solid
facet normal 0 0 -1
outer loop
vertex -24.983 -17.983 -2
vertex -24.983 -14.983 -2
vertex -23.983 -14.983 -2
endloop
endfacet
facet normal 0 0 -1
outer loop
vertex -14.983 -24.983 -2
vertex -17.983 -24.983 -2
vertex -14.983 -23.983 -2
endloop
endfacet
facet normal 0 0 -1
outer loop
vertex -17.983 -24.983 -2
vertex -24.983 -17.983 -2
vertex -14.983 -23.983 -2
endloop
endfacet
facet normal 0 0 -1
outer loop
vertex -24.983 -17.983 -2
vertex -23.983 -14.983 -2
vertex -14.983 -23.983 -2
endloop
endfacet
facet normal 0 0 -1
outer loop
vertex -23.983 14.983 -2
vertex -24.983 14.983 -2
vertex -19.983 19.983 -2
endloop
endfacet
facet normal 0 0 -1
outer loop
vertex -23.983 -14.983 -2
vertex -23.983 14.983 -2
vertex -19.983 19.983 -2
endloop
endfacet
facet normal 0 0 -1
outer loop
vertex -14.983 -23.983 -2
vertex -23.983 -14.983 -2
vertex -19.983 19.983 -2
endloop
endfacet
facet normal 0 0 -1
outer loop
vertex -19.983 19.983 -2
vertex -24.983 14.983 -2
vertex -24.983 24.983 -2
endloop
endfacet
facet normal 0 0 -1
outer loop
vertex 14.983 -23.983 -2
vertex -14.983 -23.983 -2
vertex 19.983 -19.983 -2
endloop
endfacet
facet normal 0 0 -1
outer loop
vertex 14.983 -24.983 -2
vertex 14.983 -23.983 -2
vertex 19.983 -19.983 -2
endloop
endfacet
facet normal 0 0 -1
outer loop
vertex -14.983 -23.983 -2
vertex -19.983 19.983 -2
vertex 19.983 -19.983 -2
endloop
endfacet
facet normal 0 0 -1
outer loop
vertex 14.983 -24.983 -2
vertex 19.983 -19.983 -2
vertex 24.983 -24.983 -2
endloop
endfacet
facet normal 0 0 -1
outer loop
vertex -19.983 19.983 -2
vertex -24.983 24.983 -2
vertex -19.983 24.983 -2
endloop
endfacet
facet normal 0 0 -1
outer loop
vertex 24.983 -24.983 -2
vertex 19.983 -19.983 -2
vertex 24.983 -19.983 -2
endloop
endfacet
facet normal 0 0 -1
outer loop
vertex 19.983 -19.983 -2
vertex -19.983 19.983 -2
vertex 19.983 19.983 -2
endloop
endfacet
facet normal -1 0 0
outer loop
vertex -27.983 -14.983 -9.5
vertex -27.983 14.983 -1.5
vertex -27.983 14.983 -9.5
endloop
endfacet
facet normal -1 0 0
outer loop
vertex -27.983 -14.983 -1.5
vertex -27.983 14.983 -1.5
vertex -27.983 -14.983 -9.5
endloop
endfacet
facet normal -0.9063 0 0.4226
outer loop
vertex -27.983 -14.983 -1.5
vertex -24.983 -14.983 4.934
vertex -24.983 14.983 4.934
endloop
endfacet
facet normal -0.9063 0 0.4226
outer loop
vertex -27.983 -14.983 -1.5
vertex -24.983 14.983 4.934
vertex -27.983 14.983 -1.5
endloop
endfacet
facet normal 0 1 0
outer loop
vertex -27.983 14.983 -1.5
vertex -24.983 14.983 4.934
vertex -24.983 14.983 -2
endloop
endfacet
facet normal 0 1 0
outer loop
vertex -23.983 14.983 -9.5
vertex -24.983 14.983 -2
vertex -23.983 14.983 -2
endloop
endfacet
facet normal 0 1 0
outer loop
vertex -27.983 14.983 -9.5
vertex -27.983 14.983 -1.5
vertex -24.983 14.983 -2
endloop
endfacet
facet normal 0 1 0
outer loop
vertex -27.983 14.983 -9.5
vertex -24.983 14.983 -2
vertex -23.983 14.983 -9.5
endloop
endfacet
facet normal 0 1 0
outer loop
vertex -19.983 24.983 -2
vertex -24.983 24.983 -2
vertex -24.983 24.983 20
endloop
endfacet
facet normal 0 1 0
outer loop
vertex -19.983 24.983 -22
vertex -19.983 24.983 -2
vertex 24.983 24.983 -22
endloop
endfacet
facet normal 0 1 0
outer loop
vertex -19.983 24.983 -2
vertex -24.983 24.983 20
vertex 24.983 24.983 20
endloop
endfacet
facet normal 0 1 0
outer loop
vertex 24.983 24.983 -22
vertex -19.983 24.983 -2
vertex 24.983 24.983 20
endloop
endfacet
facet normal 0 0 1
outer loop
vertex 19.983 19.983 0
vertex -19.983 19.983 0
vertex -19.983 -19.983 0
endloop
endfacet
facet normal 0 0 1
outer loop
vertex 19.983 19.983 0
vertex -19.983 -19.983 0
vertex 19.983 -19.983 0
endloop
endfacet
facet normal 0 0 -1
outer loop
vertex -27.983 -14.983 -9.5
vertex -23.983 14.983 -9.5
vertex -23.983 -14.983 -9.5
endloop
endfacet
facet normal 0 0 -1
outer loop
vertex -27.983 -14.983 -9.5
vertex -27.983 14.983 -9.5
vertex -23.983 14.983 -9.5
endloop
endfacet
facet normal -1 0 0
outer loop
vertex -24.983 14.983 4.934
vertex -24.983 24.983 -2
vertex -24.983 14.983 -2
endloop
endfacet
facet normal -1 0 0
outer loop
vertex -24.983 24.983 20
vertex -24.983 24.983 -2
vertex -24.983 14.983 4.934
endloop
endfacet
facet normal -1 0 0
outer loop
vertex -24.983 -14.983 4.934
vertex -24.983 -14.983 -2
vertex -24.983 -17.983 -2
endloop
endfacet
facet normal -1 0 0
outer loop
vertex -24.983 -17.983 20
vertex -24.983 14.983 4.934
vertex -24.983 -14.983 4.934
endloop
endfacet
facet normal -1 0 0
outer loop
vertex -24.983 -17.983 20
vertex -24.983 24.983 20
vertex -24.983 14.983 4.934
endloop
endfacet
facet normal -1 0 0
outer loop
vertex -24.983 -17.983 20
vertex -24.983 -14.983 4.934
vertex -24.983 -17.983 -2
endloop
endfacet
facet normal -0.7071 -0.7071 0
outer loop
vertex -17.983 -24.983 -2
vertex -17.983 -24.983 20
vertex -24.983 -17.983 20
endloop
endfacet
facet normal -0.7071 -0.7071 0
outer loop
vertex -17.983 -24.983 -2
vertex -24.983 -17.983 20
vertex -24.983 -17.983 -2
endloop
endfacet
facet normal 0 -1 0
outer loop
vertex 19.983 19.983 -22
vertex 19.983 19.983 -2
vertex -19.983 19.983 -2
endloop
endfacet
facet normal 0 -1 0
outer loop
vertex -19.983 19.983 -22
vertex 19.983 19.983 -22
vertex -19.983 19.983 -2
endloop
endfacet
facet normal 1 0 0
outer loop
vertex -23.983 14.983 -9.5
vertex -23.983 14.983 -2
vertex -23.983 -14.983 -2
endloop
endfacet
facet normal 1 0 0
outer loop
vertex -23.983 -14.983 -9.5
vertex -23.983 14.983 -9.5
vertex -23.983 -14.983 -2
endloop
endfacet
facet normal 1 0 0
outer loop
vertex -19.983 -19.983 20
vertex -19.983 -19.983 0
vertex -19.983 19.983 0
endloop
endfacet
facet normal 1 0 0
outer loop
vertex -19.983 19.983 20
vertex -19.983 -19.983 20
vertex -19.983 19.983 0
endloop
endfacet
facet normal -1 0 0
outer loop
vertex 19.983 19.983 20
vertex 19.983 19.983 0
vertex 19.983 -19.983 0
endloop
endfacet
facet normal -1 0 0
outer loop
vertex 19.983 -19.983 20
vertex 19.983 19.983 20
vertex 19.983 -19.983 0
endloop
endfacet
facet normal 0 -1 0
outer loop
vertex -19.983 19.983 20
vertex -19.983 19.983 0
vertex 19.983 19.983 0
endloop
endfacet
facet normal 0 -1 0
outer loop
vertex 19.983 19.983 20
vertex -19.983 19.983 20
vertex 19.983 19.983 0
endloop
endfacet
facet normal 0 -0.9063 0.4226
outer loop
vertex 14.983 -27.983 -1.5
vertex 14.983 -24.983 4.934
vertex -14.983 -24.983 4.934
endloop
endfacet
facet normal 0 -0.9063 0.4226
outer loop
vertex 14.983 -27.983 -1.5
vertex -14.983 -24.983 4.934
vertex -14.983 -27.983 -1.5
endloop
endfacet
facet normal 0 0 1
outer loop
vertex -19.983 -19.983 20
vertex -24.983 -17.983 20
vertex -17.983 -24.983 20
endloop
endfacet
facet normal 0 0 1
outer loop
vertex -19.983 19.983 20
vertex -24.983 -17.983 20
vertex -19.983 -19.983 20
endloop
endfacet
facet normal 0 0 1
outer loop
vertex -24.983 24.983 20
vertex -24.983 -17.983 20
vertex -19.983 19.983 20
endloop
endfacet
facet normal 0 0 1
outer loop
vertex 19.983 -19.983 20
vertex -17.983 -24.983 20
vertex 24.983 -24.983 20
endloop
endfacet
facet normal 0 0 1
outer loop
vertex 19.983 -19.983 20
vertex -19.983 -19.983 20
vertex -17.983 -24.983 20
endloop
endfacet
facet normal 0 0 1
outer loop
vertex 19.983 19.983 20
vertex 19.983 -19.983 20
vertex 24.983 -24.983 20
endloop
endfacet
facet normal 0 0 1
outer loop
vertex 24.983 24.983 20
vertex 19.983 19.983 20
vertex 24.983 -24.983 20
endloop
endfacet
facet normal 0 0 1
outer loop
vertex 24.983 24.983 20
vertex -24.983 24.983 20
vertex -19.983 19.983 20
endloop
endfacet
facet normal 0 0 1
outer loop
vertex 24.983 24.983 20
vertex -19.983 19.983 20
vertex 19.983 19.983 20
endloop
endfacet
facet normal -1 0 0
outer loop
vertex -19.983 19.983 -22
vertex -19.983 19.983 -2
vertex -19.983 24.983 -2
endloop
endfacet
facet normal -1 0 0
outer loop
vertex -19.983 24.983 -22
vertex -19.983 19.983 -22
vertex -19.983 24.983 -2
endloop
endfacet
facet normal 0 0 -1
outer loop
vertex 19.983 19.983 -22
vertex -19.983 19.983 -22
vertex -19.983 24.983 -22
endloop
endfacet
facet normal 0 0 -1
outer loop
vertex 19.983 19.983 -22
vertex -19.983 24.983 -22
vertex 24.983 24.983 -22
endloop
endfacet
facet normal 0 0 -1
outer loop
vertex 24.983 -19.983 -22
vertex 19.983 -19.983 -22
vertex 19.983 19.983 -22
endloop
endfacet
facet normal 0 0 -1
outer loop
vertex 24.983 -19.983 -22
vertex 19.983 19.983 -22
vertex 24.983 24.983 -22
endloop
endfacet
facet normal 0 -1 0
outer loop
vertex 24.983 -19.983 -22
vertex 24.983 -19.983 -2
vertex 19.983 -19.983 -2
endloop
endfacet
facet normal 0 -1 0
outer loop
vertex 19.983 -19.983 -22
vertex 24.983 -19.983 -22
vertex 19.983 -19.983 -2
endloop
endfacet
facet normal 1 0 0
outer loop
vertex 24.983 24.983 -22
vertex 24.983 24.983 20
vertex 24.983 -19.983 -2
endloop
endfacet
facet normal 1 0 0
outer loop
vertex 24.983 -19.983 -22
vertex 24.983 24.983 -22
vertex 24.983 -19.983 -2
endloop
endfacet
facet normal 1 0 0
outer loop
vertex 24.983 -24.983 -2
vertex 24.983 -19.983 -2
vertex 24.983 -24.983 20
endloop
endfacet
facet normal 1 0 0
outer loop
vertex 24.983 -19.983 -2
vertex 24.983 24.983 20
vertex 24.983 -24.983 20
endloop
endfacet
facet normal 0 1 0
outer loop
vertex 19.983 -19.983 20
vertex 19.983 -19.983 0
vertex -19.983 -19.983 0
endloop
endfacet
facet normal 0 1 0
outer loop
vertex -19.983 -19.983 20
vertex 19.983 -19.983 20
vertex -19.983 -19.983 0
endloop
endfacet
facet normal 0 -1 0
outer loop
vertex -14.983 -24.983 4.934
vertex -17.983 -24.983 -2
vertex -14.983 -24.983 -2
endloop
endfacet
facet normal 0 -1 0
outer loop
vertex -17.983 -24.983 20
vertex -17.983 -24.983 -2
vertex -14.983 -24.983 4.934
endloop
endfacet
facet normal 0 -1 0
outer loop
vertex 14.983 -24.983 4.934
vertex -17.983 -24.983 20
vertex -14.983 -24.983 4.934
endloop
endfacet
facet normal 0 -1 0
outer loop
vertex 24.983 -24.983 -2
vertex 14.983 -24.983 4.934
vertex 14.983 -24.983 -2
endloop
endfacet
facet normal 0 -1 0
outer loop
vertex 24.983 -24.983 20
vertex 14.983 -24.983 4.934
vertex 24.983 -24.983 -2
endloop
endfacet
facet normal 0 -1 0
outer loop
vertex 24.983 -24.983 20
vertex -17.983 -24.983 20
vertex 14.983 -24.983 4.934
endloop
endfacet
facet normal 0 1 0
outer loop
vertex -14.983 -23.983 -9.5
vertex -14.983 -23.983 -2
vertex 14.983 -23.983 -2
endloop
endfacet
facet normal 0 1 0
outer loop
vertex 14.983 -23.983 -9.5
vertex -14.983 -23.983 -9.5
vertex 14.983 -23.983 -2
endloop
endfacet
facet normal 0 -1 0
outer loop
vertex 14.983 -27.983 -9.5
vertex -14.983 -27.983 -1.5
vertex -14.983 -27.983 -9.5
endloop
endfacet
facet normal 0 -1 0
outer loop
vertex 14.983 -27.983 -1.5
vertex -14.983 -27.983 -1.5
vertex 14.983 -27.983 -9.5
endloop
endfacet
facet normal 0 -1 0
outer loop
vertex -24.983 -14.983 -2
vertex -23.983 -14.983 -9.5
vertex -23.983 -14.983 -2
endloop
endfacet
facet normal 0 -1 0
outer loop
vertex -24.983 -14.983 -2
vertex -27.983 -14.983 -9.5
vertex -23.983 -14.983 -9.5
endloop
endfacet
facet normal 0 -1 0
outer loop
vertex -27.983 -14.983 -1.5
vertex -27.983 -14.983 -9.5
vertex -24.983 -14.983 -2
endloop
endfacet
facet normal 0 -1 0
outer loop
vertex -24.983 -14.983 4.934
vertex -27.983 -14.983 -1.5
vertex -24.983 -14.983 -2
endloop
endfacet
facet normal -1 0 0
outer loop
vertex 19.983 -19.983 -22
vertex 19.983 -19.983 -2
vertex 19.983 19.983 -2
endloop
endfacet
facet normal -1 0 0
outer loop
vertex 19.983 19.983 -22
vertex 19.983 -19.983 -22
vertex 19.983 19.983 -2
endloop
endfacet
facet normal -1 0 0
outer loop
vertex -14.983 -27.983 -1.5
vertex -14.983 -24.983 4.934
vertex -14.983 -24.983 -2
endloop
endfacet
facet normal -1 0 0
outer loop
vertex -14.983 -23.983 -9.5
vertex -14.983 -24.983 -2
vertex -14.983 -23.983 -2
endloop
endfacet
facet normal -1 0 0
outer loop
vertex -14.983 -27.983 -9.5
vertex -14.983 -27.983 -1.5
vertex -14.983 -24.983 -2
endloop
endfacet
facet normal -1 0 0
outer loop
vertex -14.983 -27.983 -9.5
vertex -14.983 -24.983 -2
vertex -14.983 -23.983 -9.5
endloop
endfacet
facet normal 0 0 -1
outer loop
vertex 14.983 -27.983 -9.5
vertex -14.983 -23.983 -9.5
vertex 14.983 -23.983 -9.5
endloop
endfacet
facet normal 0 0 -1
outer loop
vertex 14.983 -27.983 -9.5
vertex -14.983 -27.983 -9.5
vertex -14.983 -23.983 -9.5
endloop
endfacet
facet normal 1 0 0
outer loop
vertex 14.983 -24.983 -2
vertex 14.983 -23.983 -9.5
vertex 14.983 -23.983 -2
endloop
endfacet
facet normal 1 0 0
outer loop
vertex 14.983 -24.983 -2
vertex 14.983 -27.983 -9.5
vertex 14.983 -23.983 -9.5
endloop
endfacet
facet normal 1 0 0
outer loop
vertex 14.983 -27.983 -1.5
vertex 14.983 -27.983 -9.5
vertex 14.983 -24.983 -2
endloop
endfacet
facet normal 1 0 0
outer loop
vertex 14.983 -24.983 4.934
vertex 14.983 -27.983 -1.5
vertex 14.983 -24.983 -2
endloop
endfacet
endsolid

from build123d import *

# Parameters (mm, degrees)
F1_DEPTH     = 20
F0_W         = 39.9660819769
F0_H         = 39.9660819769
F2_DEPTH     = 2
F4_DEPTH     = 20
F5_W         = 29.9660819769
F5_H         = 7.5
F6_DEPTH     = 3
F7_T4_DEPTH  = 66.2397385768
F8_W         = 29.9660819769
F8_H         = 7.5
F9_DEPTH     = 3
F10_T4_DEPTH = 66.2397385768
F11_DEPTH    = 1
F12_DEPTH    = 1
F13_SIZE     = 7


# Not quite as in the source:
# - a fillet or chamfer that OpenCascade refuses, or shapes differently, is made with other operations: its cross-section is extruded or revolved along the edge and cut away or added


with BuildPart() as f1:
    # F0 (on Top) → F1 (new body)
    with BuildSketch(Plane.XY):
        Polygon((24.9830409884, -24.9830409884), (24.9830409884, 19.9830409884), (19.9830409884, 19.9830409884), (19.9830409884, -19.9830409884), (-19.9830409884, -19.9830409884), (-19.9830409884, -24.9830409884), align=None)
        Polygon((24.9830409884, 24.9830409884), (-24.9830409884, 24.9830409884), (-24.9830409884, -24.9830409884), (-19.9830409884, -24.9830409884), (-19.9830409884, -19.9830409884), (-19.9830409884, 19.9830409884), (19.9830409884, 19.9830409884), (24.9830409884, 19.9830409884), align=None)
    extrude(amount=F1_DEPTH)

    # F0 (on Top) → F2 (join)
    with BuildSketch(Plane.XY):
        Polygon((24.9830409884, 24.9830409884), (-24.9830409884, 24.9830409884), (-24.9830409884, -24.9830409884), (-19.9830409884, -24.9830409884), (-19.9830409884, -19.9830409884), (-19.9830409884, 19.9830409884), (19.9830409884, 19.9830409884), (24.9830409884, 19.9830409884), align=None)
        Rectangle(F0_W, F0_H)
        Polygon((24.9830409884, -24.9830409884), (24.9830409884, 19.9830409884), (19.9830409884, 19.9830409884), (19.9830409884, -19.9830409884), (-19.9830409884, -19.9830409884), (-19.9830409884, -24.9830409884), align=None)
    extrude(amount=-F2_DEPTH)

    # F3 (on face) → F4 (join)
    with BuildSketch(Plane(origin=(0, 0, -2), x_dir=(1, 0, 0), z_dir=(0, 0, -1))):
        Polygon((24.9830409884, -24.9830409884), (24.9830409884, 19.9830409884), (19.9830409884, 19.9830409884), (19.9830409884, -19.9830409884), (-19.9830409884, -19.9830409884), (-19.9830409884, -24.9830409884), align=None)
    extrude(amount=F4_DEPTH)

    # F5 (on face) → F6 (join)
    with BuildSketch(Plane(origin=(-24.9830409884, 0, 0), x_dir=(0, -1, 0), z_dir=(-1, 0, 0))):
        with Locations((0, 1.75)):
            Rectangle(F5_W, F5_H)
        with Locations((0, -5.75)):
            Rectangle(F5_W, F5_H)
    extrude(amount=F6_DEPTH)

    # F7: chamfer of 7 x 3.2641536071 on 1 edges, made by hand


with BuildPart() as f7_tool2:
    # F7_s3 → F7_t4 (new body)
    with BuildSketch(Plane.XZ.offset(33.1198692884)):
        Polygon((-24.7188873814, 5.5), (-27.9830409884, -1.5), (-27.9830409884, 5.5), align=None)
    extrude(amount=-F7_T4_DEPTH)

    split(bisect_by=Plane.YZ.offset(-24.9830409884), keep=Keep.BOTTOM)


with BuildPart() as f1_1:
    add(f1.part)

    # F7_t1: cut F7_tool2
    add(f7_tool2.part, mode=Mode.SUBTRACT)

    # F8 (on face) → F9 (join)
    with BuildSketch(Plane.XZ.offset(24.9830409884)):
        with Locations((0, 1.75)):
            Rectangle(F8_W, F8_H)
        with Locations((0, -5.75)):
            Rectangle(F8_W, F8_H)
    extrude(amount=F9_DEPTH)

    # F10: chamfer of 7 x 3.2641536071 on 1 edges, made by hand


with BuildPart() as f10_tool2:
    # F10_s3 → F10_t4 (new body)
    with BuildSketch(Plane.YZ.offset(33.1198692884)):
        Polygon((-24.7188873814, 5.5), (-27.9830409884, -1.5), (-27.9830409884, 5.5), align=None)
    extrude(amount=-F10_T4_DEPTH)

    split(bisect_by=Plane.XZ.offset(24.9830409884), keep=Keep.TOP)


with BuildPart() as f1_2:
    add(f1_1.part)

    # F10_t1: cut F10_tool2
    add(f10_tool2.part, mode=Mode.SUBTRACT)

    # F11 (add): a face of the model
    f11_faces = [f1_2.faces().sort_by_distance(p)[0] for p in [
        (0, -24.9830409884, -5.75),
    ]]
    extrude(f11_faces, amount=F11_DEPTH)

    # F12 (add): a face of the model
    f12_faces = [f1_2.faces().sort_by_distance(p)[0] for p in [
        (-24.9830409884, 0, -5.75),
    ]]
    extrude(f12_faces, amount=F12_DEPTH)

    # F13
    f13_edges = [f1_2.edges().sort_by_distance(p)[0] for p in [
        (-24.983041, -24.983041, 9),
    ]]
    chamfer(f13_edges, length=F13_SIZE)


solid = f1_2.part
